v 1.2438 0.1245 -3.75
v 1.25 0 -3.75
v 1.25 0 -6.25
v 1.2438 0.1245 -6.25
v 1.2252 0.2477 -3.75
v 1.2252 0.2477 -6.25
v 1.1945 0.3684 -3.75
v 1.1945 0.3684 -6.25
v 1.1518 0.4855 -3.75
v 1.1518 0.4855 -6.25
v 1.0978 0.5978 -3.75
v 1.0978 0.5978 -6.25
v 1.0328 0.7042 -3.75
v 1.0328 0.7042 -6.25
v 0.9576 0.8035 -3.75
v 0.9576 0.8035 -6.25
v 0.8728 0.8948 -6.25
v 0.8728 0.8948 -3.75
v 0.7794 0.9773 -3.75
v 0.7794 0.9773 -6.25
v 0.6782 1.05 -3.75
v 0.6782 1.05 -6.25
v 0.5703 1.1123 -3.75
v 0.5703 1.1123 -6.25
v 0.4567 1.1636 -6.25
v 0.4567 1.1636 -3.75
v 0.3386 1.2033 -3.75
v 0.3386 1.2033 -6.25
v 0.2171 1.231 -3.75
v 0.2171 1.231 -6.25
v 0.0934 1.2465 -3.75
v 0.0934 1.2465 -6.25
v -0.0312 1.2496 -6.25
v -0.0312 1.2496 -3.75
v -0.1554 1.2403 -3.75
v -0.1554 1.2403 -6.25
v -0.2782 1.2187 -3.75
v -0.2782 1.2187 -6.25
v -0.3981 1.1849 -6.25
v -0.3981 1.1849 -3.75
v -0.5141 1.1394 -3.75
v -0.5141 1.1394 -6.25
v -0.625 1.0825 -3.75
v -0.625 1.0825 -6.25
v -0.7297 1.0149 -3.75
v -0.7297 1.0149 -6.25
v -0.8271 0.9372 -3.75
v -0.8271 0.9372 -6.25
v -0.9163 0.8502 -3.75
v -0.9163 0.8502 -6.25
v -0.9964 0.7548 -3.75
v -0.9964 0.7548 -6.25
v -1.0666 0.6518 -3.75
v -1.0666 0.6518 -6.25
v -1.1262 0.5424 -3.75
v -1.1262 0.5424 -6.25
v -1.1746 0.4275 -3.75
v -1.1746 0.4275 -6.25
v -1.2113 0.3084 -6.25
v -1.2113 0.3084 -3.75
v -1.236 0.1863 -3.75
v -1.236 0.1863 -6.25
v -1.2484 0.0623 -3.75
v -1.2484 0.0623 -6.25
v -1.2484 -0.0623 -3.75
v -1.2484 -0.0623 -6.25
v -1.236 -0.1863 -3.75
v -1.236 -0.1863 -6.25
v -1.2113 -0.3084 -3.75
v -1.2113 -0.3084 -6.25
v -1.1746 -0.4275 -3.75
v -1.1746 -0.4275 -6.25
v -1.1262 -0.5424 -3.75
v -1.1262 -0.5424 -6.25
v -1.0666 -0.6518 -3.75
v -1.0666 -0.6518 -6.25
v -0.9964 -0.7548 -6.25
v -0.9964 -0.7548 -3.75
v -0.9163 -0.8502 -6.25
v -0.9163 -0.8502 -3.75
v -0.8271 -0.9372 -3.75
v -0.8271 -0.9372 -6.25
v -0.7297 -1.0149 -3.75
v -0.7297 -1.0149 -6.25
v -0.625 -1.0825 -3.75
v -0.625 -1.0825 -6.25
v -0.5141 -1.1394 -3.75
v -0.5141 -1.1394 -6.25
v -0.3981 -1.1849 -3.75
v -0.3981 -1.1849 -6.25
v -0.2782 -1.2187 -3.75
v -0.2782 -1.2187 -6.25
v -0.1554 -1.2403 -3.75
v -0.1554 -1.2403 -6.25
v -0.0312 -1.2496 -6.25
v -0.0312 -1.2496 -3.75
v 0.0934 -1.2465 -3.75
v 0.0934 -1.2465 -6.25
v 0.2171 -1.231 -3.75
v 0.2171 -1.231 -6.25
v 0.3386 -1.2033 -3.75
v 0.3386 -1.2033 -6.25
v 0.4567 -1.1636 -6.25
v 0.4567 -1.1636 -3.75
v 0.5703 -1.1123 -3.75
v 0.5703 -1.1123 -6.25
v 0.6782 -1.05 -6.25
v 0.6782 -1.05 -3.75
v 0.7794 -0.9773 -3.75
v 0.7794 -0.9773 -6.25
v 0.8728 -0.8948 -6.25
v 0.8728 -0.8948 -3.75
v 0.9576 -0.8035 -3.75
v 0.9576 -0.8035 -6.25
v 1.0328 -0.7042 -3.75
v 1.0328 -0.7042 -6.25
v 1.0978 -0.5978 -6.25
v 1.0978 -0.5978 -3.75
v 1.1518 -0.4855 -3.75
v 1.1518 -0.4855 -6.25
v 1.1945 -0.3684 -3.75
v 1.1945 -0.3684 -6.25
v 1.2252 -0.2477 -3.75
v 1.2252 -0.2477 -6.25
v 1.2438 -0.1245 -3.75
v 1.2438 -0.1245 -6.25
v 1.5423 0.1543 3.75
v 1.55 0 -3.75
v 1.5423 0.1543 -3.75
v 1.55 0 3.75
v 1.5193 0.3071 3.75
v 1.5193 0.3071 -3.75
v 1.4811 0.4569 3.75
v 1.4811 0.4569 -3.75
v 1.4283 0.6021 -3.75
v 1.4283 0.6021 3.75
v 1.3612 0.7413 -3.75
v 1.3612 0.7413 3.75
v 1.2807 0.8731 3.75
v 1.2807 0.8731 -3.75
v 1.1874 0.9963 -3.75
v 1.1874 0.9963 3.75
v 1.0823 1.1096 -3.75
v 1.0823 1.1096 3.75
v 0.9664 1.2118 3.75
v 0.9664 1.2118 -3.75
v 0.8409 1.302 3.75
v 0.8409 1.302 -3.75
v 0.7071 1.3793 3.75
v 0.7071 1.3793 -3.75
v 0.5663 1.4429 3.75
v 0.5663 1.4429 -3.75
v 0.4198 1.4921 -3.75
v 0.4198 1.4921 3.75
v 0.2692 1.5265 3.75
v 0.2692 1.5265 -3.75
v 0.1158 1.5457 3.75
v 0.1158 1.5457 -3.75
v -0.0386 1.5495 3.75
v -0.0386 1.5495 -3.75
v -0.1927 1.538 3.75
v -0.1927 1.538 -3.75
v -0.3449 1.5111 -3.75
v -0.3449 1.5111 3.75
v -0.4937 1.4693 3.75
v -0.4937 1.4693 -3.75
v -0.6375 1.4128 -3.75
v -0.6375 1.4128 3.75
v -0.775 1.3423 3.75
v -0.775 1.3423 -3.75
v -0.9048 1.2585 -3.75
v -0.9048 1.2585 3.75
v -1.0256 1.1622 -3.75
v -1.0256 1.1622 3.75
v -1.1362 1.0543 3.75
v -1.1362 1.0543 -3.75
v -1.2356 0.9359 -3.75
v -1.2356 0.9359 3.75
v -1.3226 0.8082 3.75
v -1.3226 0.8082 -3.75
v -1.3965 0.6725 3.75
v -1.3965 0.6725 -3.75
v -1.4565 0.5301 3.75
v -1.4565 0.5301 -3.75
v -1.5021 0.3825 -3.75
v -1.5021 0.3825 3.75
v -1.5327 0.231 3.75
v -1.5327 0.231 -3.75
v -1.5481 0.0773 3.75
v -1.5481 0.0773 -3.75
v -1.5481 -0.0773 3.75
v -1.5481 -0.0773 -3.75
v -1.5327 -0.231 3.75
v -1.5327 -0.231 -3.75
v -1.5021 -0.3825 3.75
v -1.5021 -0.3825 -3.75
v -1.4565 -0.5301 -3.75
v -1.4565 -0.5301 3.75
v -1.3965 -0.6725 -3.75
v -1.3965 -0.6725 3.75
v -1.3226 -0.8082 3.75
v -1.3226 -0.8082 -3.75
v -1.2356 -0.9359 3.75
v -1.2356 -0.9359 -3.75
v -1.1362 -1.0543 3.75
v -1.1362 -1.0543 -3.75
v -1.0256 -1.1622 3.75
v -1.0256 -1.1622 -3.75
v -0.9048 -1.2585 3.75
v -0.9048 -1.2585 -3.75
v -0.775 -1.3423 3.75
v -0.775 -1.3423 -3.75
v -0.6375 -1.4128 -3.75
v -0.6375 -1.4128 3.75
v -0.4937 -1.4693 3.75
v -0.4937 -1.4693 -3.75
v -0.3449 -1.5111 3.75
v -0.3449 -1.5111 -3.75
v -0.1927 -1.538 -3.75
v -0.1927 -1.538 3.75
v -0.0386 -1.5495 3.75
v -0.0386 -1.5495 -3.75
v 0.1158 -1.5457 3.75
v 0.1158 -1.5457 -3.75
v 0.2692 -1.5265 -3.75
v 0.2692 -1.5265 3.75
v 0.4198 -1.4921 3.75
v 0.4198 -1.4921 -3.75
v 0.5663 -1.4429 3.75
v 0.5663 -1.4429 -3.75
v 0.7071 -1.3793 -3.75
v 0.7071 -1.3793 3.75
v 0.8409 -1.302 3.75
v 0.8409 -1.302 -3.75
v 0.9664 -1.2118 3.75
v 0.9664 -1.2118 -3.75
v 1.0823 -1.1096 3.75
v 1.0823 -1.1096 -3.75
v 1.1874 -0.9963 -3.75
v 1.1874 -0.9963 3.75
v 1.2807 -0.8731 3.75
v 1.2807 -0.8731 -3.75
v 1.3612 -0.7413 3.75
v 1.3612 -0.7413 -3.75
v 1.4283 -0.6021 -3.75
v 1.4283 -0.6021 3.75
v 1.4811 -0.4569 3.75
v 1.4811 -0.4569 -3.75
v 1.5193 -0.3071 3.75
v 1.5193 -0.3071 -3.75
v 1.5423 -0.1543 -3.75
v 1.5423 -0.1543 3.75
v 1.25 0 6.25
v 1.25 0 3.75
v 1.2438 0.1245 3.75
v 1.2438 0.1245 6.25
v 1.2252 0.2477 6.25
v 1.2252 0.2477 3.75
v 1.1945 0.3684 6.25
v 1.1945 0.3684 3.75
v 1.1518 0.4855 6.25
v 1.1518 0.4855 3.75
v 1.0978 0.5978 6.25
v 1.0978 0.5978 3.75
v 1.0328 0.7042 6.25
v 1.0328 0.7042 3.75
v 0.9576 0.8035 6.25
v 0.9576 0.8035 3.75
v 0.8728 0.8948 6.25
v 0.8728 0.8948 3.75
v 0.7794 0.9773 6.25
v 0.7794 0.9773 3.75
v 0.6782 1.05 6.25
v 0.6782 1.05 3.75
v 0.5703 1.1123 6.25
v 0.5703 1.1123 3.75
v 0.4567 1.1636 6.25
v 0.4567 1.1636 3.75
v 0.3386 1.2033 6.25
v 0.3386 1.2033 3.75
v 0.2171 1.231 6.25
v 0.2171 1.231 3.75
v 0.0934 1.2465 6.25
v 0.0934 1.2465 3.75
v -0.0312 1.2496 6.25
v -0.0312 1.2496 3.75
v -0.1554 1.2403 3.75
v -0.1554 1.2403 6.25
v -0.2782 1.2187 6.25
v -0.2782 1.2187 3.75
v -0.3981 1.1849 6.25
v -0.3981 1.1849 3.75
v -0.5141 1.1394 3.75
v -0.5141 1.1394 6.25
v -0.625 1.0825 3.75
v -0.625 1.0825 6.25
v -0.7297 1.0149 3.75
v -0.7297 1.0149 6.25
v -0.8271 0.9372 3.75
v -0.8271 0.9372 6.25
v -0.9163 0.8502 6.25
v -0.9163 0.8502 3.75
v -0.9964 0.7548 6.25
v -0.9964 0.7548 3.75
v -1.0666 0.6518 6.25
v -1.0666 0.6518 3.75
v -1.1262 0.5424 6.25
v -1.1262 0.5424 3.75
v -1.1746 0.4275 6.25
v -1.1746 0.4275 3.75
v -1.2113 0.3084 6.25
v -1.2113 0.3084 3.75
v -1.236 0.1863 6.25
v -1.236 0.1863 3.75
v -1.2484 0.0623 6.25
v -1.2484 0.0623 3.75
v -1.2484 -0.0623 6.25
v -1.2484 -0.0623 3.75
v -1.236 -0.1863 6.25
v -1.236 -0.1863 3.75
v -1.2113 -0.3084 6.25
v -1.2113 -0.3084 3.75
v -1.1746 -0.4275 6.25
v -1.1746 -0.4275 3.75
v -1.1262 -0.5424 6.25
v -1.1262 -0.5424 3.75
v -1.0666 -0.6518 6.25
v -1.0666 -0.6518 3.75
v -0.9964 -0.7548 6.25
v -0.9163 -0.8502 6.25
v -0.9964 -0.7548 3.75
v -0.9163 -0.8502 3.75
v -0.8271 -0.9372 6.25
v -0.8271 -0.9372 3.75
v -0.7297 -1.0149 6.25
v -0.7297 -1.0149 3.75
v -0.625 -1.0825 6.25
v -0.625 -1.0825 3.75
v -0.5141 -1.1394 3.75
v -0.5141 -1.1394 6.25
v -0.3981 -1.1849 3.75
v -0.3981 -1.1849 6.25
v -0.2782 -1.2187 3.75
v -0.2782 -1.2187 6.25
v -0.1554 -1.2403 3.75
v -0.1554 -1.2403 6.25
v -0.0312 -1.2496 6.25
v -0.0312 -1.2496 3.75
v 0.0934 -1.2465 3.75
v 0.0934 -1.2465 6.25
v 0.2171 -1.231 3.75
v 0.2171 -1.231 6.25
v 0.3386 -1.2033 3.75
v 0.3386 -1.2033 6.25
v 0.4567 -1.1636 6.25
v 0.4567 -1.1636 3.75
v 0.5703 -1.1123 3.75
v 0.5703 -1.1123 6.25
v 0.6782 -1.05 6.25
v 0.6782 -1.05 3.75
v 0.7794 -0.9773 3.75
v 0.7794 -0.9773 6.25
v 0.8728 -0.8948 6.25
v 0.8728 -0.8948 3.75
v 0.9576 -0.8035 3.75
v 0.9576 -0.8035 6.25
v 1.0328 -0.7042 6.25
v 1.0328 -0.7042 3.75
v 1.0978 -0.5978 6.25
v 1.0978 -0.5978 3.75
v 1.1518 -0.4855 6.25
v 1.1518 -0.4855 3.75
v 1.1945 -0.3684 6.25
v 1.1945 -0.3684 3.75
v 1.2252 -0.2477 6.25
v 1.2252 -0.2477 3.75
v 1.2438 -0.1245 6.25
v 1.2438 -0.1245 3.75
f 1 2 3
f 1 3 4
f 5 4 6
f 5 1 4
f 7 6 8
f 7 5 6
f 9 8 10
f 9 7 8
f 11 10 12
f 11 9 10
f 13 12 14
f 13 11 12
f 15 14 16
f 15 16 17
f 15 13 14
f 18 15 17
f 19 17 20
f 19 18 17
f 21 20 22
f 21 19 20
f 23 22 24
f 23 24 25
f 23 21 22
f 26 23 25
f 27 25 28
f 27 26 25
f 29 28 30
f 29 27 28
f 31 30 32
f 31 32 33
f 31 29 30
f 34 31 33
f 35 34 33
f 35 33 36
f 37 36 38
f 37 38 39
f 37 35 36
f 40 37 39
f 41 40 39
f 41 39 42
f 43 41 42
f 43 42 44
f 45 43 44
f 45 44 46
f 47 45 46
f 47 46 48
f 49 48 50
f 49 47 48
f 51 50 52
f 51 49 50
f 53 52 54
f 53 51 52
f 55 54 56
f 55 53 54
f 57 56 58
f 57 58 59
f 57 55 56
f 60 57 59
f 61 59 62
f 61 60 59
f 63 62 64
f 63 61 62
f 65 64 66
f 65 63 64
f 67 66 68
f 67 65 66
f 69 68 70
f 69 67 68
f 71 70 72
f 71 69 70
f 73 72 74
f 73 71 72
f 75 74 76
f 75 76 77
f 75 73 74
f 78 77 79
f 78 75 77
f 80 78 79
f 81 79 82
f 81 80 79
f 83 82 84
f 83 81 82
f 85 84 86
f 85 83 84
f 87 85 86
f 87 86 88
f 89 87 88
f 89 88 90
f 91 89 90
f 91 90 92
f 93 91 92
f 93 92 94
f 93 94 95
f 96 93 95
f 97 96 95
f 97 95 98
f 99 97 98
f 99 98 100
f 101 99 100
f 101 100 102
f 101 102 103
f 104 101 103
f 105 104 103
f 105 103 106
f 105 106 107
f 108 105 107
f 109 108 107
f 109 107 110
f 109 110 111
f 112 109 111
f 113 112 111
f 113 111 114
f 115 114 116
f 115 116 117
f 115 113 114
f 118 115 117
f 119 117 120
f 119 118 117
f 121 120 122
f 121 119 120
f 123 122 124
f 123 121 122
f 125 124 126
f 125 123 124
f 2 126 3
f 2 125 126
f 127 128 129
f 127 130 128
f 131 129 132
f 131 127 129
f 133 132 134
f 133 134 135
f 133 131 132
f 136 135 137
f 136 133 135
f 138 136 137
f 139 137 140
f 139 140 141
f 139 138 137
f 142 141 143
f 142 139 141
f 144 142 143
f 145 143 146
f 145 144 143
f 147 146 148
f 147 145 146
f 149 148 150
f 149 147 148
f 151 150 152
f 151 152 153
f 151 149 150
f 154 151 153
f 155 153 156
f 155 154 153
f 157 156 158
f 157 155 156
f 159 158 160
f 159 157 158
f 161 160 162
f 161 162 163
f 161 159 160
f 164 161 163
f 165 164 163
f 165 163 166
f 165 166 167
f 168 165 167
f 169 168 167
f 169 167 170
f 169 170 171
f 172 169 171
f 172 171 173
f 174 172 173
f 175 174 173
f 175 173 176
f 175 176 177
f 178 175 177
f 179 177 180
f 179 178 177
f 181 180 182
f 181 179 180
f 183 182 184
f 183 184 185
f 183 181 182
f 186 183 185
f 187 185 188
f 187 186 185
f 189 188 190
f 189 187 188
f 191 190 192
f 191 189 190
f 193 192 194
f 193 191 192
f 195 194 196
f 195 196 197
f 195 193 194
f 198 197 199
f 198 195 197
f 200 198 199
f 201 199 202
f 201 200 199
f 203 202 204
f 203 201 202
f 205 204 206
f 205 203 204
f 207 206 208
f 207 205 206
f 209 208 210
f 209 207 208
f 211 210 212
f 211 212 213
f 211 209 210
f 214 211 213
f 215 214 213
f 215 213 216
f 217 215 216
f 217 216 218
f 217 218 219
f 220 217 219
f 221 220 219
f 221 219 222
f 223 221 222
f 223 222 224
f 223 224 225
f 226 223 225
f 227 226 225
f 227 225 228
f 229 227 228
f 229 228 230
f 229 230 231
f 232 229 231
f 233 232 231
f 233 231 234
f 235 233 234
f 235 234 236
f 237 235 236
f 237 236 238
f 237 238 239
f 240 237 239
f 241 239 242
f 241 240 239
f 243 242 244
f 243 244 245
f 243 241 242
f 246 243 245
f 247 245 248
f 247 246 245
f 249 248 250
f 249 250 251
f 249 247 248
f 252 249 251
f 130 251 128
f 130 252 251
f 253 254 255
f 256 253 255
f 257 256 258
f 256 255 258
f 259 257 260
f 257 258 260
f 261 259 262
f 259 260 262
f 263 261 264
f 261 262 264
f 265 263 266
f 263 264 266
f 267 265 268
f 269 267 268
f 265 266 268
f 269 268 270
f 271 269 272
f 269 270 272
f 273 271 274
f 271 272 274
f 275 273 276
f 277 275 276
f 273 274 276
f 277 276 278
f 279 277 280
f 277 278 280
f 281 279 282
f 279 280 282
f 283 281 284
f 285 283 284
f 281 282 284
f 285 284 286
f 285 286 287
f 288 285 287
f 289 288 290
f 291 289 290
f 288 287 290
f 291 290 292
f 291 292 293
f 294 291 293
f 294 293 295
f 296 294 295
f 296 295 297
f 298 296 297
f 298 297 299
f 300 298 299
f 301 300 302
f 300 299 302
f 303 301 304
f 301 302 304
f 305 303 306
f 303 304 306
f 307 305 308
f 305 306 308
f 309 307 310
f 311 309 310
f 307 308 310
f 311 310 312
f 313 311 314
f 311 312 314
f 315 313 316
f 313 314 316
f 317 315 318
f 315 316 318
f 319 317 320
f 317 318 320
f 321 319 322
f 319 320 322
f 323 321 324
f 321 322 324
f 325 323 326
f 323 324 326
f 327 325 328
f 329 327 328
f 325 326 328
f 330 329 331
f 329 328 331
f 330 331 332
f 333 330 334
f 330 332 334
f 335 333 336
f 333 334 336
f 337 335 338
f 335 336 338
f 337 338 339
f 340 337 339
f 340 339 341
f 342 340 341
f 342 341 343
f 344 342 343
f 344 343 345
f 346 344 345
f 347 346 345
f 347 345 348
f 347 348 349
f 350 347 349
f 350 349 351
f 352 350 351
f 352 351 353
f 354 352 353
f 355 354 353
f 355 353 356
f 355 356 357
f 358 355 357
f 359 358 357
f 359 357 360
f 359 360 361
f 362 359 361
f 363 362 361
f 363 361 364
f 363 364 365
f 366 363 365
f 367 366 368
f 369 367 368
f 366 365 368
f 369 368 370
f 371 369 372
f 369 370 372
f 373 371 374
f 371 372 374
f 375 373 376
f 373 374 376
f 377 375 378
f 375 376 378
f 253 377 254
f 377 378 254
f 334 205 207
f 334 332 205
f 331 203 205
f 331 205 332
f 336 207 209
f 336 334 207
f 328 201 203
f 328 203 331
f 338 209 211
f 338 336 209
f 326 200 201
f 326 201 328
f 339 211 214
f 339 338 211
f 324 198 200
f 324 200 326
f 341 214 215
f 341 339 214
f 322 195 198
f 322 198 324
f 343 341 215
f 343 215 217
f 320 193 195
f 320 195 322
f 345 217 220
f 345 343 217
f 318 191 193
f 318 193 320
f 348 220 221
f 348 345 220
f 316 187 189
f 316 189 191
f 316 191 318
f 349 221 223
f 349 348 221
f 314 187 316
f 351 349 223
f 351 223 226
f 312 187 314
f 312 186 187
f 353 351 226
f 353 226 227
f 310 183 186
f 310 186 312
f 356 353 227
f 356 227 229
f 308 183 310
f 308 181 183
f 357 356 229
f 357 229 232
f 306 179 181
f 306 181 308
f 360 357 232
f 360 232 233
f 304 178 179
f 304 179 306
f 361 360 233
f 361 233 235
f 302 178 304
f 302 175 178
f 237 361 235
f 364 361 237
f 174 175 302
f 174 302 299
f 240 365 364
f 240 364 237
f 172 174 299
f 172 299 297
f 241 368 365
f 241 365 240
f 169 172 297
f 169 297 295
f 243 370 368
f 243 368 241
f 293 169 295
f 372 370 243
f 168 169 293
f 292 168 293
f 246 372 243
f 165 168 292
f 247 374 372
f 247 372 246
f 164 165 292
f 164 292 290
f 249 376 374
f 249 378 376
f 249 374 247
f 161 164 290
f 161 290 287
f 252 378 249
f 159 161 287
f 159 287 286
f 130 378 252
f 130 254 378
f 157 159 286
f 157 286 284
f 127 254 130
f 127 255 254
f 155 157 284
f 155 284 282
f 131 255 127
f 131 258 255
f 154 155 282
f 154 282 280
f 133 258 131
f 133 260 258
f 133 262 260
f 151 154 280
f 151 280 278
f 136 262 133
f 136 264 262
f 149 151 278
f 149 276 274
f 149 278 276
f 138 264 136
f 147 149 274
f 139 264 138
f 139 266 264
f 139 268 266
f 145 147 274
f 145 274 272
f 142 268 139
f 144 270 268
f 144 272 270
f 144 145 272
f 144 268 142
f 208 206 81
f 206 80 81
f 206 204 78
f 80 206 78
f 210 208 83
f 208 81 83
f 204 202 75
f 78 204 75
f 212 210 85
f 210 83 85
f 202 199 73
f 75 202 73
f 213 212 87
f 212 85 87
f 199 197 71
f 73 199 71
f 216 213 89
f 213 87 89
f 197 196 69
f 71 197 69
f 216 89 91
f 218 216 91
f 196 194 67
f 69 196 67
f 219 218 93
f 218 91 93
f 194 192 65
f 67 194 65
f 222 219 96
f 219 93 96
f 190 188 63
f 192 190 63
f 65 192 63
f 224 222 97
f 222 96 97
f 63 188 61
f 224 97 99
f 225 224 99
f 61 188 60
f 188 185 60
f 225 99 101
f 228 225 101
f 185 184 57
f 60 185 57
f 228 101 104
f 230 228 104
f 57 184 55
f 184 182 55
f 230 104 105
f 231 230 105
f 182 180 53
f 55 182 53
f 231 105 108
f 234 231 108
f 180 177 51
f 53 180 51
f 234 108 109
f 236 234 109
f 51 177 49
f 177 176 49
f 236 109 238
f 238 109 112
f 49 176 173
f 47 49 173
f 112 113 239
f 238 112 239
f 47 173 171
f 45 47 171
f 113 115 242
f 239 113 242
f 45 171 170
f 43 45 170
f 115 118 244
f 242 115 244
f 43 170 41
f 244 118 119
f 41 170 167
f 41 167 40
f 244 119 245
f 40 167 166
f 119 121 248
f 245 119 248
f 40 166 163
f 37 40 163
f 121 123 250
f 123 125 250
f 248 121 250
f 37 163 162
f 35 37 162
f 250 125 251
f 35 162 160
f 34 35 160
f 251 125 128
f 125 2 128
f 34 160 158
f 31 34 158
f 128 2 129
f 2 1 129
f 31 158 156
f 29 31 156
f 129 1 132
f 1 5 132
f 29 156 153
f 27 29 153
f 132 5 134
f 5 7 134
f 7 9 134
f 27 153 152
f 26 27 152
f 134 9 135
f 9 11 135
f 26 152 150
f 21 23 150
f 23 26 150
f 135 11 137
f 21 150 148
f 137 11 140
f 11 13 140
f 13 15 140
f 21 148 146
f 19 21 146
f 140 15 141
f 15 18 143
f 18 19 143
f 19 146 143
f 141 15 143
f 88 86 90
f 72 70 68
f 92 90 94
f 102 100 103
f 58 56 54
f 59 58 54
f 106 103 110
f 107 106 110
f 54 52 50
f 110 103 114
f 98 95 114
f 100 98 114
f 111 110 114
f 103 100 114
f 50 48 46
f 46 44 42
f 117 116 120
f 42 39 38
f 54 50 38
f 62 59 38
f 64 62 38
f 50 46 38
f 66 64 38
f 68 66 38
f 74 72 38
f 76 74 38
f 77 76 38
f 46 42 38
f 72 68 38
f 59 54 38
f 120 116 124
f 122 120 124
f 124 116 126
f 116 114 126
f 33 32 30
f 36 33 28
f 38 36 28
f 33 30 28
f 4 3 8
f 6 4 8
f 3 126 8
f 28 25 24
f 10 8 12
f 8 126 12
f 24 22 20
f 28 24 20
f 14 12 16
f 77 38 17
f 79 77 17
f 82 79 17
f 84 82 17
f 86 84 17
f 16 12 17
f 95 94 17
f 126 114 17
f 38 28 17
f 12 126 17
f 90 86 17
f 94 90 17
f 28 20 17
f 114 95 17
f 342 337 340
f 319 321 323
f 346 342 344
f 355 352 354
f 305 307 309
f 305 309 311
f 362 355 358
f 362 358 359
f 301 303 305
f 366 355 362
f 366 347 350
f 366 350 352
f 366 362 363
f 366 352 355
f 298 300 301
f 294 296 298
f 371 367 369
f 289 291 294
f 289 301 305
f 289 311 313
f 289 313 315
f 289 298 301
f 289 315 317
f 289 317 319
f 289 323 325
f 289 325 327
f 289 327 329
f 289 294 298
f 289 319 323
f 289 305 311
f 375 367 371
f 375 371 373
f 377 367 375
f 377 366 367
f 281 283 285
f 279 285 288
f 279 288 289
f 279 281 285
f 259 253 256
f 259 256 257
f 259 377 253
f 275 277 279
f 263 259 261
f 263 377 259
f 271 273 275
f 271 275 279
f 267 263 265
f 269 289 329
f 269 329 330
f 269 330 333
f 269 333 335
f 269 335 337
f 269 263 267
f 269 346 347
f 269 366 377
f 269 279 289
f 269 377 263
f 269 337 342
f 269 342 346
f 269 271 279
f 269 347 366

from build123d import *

# Parameters (mm, degrees)
SKETCH2_R           = 1.55
BOSS_EXTRUDE2_DEPTH = 3.75
SKETCH4_R           = 1.25
BOSS_EXTRUDE3_DEPTH = 2.5


with BuildPart() as part:
    # Sketch2 → Boss-Extrude2 (new body)
    with BuildSketch(Plane.XY):
        Circle(SKETCH2_R)
    boss_extrude2 = extrude(amount=BOSS_EXTRUDE2_DEPTH)

    # Sketch4 → Boss-Extrude3 (add)
    with BuildSketch(Plane.XY.offset(3.75)):
        Circle(SKETCH4_R)
    boss_extrude3 = extrude(amount=BOSS_EXTRUDE3_DEPTH)

    # Mirror3: Boss-Extrude2, Boss-Extrude3 across plane
    add(boss_extrude2.mirror(Plane.XY))
    add(boss_extrude3.mirror(Plane.XY))


solid = part.part
